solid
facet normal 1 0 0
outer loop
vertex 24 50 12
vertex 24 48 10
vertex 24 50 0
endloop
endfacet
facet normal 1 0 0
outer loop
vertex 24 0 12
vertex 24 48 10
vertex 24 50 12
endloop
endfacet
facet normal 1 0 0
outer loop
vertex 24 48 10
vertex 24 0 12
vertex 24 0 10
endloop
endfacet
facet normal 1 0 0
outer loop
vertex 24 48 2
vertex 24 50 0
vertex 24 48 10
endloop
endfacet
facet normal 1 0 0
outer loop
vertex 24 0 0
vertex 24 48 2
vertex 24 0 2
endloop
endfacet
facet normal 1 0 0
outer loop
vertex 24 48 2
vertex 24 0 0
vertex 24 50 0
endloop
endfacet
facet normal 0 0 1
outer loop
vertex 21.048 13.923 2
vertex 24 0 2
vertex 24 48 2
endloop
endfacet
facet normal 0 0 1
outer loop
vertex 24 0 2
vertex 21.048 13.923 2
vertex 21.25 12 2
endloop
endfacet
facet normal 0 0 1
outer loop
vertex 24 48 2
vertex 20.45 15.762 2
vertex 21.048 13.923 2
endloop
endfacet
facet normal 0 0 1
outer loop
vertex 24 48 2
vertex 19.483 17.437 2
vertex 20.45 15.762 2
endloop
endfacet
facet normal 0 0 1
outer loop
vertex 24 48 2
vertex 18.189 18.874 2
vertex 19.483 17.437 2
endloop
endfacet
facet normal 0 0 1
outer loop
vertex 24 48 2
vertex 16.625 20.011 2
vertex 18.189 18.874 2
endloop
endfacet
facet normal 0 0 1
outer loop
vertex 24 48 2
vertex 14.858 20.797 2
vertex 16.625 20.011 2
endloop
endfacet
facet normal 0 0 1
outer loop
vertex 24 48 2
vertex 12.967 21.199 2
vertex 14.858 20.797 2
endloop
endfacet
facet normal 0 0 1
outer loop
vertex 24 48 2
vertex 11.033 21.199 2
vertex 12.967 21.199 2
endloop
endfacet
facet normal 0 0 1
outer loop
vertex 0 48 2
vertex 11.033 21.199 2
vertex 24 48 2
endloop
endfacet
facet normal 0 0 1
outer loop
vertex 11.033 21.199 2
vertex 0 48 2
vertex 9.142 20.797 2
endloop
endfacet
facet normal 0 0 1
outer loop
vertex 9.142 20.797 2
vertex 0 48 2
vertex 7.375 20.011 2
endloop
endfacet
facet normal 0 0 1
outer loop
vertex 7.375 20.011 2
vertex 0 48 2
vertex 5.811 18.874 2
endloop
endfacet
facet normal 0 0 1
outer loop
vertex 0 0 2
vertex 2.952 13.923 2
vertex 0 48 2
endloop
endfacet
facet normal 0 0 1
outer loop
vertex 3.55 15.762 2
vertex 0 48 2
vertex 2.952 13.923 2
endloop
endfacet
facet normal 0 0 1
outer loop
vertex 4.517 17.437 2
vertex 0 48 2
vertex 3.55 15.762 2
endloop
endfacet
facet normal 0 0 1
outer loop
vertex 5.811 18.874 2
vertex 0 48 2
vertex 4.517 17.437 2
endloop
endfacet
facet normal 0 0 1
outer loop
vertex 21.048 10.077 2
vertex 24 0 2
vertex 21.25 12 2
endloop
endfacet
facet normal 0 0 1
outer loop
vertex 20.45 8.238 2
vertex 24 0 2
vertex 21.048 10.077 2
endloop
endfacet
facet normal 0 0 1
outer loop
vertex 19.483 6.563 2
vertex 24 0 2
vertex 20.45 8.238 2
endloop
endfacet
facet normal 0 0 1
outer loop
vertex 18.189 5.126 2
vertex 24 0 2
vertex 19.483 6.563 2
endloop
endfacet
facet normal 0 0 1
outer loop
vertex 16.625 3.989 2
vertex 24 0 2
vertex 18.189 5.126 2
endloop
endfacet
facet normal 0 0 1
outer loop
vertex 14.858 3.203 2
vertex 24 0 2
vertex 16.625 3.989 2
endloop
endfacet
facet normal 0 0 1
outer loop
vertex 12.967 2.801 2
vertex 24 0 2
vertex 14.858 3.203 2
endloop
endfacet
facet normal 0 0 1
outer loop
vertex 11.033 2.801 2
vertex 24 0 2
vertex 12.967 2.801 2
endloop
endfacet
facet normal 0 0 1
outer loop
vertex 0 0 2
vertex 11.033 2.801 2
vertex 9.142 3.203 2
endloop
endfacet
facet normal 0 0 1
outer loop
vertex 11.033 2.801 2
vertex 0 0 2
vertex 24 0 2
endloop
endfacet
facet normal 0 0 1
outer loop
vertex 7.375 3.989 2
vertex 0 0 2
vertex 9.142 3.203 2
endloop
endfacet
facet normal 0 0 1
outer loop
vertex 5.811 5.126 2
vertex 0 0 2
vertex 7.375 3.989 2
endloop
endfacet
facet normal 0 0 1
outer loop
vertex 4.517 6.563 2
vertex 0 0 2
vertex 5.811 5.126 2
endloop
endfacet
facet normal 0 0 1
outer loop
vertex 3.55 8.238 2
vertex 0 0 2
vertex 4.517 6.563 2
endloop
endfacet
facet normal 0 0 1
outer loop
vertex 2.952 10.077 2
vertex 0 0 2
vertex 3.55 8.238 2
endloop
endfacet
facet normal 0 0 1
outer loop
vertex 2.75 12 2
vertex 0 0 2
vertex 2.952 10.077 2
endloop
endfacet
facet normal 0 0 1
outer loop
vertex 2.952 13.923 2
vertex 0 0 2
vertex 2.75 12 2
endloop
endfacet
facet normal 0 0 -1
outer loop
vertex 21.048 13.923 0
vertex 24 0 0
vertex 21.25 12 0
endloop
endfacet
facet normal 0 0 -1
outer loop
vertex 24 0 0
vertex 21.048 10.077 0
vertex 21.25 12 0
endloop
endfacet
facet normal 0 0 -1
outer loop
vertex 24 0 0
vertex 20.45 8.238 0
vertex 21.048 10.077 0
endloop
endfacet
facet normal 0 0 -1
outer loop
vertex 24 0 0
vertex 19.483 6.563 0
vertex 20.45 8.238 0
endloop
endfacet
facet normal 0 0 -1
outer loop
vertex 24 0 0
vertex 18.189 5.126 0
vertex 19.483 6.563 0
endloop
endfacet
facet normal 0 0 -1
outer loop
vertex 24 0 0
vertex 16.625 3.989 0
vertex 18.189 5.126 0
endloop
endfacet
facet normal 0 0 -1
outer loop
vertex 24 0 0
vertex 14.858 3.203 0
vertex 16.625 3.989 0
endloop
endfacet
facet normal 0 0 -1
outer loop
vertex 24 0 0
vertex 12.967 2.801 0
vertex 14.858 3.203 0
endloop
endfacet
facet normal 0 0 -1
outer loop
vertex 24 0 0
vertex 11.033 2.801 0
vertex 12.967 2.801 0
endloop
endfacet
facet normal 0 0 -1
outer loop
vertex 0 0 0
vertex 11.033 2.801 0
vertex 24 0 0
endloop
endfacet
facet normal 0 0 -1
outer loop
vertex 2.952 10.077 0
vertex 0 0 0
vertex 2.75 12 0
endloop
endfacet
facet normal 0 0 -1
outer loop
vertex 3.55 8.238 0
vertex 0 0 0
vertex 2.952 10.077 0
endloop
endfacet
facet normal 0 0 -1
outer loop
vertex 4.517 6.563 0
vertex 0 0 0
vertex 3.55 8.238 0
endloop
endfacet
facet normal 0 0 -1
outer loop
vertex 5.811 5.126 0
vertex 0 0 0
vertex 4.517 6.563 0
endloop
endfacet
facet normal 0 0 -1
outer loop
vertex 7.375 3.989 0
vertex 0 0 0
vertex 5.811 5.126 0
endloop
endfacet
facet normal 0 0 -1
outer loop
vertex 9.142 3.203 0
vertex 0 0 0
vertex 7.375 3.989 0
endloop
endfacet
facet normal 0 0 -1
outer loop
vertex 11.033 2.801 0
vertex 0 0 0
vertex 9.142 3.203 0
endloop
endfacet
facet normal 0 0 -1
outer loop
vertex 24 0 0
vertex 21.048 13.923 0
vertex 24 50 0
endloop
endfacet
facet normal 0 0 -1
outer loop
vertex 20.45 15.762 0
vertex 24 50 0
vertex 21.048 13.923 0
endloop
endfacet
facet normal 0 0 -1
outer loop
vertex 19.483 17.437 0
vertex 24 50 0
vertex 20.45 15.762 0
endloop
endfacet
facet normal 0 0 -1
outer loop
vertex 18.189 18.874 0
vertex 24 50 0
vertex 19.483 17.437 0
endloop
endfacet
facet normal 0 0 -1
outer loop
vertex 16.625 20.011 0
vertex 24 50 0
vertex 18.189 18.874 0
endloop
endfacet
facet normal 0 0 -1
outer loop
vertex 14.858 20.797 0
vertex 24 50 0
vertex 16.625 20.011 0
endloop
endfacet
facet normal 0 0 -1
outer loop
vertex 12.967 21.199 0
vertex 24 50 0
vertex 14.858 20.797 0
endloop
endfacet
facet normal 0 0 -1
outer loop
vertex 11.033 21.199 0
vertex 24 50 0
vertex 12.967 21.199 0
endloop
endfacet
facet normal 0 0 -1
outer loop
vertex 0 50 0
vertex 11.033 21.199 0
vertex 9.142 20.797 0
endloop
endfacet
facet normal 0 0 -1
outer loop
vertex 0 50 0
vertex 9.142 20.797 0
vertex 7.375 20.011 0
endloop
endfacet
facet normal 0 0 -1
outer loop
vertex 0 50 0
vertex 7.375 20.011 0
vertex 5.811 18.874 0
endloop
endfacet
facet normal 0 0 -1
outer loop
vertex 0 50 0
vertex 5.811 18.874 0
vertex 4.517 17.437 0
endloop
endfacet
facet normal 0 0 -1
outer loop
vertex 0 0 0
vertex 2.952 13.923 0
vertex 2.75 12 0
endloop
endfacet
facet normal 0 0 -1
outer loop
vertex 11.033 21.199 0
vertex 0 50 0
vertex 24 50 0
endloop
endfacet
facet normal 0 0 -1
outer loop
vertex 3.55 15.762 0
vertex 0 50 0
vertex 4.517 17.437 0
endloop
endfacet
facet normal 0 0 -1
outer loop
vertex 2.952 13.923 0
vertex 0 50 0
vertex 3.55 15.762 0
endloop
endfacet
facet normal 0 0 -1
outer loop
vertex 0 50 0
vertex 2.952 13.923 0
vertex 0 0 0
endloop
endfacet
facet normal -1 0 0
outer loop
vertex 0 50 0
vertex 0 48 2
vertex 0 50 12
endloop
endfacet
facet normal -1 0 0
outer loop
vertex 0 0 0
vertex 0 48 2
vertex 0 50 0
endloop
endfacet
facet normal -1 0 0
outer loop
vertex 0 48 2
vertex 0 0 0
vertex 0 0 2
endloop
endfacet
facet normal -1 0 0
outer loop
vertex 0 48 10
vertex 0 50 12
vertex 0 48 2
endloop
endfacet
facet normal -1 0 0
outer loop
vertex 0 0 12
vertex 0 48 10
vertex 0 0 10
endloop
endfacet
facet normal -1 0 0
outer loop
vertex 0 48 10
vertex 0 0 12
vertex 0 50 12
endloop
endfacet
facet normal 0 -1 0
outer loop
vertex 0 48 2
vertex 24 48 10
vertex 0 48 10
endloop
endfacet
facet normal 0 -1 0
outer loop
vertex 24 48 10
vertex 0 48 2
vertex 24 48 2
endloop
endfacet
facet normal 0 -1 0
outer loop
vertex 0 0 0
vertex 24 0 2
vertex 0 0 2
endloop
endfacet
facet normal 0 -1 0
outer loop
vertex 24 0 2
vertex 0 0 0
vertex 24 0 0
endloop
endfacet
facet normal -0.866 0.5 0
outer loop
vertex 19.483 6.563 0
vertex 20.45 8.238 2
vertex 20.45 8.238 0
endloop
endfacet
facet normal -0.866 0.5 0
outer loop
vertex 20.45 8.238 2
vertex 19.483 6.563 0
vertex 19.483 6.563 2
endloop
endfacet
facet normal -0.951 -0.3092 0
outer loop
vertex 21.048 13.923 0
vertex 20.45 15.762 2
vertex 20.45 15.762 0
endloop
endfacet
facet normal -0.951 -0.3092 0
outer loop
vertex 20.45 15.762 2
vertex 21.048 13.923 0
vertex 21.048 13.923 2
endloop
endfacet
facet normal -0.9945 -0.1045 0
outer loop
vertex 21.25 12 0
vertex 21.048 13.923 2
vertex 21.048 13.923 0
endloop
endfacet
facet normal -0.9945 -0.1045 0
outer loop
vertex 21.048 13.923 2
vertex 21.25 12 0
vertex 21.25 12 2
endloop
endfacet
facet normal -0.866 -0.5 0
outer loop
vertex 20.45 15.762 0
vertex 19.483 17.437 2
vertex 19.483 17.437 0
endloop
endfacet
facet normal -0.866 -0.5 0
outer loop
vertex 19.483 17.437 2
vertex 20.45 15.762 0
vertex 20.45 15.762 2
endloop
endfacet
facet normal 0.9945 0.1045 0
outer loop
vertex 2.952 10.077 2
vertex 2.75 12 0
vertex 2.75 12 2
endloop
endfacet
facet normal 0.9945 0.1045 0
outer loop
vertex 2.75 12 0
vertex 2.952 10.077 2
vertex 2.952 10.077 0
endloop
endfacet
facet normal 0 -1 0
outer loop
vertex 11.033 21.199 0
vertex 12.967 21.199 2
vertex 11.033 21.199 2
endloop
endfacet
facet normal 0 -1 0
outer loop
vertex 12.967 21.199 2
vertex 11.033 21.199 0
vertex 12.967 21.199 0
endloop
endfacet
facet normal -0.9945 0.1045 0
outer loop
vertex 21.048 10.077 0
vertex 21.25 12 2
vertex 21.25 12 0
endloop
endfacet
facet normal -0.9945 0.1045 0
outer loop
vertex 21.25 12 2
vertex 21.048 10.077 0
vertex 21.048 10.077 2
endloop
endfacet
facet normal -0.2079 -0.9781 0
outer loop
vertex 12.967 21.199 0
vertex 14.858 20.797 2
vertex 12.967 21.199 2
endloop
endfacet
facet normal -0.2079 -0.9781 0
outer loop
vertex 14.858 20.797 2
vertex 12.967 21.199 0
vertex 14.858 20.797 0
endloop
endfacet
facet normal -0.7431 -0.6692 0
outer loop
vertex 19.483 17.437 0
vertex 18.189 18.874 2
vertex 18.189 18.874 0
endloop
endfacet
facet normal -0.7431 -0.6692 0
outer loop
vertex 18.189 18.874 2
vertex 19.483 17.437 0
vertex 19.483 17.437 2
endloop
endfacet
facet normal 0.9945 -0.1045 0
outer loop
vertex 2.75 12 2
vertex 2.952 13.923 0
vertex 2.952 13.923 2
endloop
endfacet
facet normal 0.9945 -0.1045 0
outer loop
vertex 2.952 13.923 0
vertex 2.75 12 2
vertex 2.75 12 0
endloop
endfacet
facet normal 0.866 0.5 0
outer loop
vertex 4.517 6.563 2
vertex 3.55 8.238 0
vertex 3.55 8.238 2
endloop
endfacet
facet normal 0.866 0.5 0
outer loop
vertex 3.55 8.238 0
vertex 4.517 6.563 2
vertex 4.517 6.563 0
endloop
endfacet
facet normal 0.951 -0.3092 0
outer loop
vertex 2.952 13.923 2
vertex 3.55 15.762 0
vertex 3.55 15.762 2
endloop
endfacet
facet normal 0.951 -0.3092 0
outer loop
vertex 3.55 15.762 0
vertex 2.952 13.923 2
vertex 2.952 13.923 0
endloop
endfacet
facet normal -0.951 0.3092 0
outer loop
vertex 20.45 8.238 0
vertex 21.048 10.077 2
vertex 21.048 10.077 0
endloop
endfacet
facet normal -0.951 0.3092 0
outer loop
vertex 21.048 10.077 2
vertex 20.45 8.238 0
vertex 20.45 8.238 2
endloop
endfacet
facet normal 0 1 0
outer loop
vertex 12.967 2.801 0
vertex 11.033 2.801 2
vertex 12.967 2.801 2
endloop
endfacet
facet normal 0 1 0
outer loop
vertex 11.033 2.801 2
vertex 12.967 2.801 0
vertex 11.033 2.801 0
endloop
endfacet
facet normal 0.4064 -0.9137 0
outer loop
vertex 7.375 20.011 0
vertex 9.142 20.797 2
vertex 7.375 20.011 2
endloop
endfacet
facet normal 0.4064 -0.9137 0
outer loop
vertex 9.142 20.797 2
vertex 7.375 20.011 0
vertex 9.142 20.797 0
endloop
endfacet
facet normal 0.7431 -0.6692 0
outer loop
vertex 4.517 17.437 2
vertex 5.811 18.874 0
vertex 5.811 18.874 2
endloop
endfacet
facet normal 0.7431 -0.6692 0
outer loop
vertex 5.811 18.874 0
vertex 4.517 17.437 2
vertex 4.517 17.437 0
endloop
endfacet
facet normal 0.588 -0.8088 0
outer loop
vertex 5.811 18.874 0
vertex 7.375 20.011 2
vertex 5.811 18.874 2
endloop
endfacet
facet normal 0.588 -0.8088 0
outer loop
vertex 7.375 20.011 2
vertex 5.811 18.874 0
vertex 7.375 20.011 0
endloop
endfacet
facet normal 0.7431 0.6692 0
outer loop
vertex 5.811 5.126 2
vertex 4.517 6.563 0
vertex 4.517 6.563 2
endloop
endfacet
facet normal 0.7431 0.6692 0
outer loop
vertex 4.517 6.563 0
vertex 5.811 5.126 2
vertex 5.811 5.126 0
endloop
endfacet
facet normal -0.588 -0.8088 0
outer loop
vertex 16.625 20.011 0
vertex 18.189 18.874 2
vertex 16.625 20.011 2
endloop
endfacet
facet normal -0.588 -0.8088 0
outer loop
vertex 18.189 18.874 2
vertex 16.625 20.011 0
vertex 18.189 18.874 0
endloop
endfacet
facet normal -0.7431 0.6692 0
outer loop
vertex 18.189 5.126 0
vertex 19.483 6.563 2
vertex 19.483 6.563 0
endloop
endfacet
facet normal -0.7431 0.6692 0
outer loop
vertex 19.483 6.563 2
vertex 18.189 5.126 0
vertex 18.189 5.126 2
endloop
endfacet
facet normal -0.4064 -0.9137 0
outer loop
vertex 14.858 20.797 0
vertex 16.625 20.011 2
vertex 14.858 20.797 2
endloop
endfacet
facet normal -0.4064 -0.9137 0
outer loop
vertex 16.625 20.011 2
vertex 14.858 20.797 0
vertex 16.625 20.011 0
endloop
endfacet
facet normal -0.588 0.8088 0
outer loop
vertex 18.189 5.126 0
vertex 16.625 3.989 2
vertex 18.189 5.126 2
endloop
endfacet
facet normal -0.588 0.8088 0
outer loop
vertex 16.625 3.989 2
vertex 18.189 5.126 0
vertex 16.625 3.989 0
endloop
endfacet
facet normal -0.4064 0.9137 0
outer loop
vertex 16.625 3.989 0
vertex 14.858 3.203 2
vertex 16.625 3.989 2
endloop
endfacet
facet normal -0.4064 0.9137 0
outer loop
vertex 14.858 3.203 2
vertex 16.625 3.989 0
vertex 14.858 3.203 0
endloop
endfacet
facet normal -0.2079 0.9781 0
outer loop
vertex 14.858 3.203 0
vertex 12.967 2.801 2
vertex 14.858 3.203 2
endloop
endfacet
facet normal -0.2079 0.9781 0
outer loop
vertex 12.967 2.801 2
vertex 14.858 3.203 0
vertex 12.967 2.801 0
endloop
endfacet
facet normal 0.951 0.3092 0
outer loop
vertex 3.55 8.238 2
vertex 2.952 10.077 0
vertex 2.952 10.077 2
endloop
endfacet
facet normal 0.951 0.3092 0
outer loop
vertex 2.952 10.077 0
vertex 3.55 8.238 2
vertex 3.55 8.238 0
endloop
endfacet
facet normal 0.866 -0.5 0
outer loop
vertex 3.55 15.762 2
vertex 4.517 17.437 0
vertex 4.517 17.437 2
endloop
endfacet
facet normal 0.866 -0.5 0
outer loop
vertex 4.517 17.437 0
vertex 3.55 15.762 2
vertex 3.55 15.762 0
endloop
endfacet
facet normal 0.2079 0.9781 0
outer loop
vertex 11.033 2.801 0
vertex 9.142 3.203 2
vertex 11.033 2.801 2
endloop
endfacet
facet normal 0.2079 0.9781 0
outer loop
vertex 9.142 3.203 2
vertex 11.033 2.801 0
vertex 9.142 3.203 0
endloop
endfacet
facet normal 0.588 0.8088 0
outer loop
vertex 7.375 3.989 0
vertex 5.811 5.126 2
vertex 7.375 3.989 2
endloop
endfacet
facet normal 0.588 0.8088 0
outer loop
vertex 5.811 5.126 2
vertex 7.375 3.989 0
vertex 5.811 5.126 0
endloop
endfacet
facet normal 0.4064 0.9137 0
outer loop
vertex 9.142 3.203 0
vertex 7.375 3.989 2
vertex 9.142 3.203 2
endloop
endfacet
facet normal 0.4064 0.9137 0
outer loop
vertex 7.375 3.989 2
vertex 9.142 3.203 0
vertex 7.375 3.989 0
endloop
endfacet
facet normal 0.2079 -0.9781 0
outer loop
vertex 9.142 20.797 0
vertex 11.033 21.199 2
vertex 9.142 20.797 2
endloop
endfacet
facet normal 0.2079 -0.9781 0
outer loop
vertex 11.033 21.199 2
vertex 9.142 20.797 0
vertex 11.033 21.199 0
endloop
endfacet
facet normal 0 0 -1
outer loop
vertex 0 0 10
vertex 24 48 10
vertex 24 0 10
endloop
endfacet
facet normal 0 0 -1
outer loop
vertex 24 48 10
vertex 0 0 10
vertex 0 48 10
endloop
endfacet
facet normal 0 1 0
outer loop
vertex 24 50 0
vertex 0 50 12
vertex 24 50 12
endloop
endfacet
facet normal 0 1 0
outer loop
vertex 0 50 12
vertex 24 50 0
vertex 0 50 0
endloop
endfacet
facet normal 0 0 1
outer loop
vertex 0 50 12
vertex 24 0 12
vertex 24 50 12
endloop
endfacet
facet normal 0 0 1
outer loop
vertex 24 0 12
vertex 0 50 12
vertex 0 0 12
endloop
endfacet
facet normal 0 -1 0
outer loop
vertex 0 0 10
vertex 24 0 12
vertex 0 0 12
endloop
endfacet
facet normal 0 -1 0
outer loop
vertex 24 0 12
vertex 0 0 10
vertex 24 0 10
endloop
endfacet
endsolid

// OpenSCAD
// file: constants.scad
//-------------------------------------------------------------
//-- Futaba Horn from Servo wheel by Juan Gonzalez (obijuan) juan@iearobotics.com
//-------------------------------------------------------------

//-- Wheel parameters
wheel_or_idiam = 50;                   //-- O-ring inner diameter
wheel_or_diam = 1;                     //-- O-ring section diameter
wheel_height = 2*wheel_or_diam+0;     //-- Wheel height: change the 0 for 
                                      //-- other value (0 equals minimun height)
//-- Parameters common to all horns
horn_drill_diam = 2;
horn_height = 8;        //-- Total height: shaft + plate
horn_plate_height = 2;  //-- plate height

//-- Futaba 3003 servo rounded horn parameters
rh_diam1 = 8.5;  //-- Rounded horn small diameter
rh_diam2 = 24; //-- Rounded horn big diameter
rounded_horn_drill_distance = 7.3;

//-- Futaba 3003 4-arm horn parameters
a4h_end_diam = 5;
a4h_center_diam = 10;
a4h_arm_length = 15;
a4h_drill_distance = 13.3;

//-- Pill parameters
pill_diam = 16;
pill_height = 8;
pill_holder = pill_diam * 1.5;

length = 70;
// main file
include <constants.scad>;

difference() {
	cube([pill_holder, pill_holder * 2, 2]);
	translate([pill_diam / 2 + 4, pill_diam - 4, -1])
		cylinder(h=4, r=(pill_diam + 2) / 2 + 0.25);
}

translate([0, pill_holder * 2, 0])
	cube([pill_holder, 2, pill_height + 2]);

translate([0, 0, pill_height + 2])
	cube([pill_holder, pill_holder * 2 + 2, 2]);
